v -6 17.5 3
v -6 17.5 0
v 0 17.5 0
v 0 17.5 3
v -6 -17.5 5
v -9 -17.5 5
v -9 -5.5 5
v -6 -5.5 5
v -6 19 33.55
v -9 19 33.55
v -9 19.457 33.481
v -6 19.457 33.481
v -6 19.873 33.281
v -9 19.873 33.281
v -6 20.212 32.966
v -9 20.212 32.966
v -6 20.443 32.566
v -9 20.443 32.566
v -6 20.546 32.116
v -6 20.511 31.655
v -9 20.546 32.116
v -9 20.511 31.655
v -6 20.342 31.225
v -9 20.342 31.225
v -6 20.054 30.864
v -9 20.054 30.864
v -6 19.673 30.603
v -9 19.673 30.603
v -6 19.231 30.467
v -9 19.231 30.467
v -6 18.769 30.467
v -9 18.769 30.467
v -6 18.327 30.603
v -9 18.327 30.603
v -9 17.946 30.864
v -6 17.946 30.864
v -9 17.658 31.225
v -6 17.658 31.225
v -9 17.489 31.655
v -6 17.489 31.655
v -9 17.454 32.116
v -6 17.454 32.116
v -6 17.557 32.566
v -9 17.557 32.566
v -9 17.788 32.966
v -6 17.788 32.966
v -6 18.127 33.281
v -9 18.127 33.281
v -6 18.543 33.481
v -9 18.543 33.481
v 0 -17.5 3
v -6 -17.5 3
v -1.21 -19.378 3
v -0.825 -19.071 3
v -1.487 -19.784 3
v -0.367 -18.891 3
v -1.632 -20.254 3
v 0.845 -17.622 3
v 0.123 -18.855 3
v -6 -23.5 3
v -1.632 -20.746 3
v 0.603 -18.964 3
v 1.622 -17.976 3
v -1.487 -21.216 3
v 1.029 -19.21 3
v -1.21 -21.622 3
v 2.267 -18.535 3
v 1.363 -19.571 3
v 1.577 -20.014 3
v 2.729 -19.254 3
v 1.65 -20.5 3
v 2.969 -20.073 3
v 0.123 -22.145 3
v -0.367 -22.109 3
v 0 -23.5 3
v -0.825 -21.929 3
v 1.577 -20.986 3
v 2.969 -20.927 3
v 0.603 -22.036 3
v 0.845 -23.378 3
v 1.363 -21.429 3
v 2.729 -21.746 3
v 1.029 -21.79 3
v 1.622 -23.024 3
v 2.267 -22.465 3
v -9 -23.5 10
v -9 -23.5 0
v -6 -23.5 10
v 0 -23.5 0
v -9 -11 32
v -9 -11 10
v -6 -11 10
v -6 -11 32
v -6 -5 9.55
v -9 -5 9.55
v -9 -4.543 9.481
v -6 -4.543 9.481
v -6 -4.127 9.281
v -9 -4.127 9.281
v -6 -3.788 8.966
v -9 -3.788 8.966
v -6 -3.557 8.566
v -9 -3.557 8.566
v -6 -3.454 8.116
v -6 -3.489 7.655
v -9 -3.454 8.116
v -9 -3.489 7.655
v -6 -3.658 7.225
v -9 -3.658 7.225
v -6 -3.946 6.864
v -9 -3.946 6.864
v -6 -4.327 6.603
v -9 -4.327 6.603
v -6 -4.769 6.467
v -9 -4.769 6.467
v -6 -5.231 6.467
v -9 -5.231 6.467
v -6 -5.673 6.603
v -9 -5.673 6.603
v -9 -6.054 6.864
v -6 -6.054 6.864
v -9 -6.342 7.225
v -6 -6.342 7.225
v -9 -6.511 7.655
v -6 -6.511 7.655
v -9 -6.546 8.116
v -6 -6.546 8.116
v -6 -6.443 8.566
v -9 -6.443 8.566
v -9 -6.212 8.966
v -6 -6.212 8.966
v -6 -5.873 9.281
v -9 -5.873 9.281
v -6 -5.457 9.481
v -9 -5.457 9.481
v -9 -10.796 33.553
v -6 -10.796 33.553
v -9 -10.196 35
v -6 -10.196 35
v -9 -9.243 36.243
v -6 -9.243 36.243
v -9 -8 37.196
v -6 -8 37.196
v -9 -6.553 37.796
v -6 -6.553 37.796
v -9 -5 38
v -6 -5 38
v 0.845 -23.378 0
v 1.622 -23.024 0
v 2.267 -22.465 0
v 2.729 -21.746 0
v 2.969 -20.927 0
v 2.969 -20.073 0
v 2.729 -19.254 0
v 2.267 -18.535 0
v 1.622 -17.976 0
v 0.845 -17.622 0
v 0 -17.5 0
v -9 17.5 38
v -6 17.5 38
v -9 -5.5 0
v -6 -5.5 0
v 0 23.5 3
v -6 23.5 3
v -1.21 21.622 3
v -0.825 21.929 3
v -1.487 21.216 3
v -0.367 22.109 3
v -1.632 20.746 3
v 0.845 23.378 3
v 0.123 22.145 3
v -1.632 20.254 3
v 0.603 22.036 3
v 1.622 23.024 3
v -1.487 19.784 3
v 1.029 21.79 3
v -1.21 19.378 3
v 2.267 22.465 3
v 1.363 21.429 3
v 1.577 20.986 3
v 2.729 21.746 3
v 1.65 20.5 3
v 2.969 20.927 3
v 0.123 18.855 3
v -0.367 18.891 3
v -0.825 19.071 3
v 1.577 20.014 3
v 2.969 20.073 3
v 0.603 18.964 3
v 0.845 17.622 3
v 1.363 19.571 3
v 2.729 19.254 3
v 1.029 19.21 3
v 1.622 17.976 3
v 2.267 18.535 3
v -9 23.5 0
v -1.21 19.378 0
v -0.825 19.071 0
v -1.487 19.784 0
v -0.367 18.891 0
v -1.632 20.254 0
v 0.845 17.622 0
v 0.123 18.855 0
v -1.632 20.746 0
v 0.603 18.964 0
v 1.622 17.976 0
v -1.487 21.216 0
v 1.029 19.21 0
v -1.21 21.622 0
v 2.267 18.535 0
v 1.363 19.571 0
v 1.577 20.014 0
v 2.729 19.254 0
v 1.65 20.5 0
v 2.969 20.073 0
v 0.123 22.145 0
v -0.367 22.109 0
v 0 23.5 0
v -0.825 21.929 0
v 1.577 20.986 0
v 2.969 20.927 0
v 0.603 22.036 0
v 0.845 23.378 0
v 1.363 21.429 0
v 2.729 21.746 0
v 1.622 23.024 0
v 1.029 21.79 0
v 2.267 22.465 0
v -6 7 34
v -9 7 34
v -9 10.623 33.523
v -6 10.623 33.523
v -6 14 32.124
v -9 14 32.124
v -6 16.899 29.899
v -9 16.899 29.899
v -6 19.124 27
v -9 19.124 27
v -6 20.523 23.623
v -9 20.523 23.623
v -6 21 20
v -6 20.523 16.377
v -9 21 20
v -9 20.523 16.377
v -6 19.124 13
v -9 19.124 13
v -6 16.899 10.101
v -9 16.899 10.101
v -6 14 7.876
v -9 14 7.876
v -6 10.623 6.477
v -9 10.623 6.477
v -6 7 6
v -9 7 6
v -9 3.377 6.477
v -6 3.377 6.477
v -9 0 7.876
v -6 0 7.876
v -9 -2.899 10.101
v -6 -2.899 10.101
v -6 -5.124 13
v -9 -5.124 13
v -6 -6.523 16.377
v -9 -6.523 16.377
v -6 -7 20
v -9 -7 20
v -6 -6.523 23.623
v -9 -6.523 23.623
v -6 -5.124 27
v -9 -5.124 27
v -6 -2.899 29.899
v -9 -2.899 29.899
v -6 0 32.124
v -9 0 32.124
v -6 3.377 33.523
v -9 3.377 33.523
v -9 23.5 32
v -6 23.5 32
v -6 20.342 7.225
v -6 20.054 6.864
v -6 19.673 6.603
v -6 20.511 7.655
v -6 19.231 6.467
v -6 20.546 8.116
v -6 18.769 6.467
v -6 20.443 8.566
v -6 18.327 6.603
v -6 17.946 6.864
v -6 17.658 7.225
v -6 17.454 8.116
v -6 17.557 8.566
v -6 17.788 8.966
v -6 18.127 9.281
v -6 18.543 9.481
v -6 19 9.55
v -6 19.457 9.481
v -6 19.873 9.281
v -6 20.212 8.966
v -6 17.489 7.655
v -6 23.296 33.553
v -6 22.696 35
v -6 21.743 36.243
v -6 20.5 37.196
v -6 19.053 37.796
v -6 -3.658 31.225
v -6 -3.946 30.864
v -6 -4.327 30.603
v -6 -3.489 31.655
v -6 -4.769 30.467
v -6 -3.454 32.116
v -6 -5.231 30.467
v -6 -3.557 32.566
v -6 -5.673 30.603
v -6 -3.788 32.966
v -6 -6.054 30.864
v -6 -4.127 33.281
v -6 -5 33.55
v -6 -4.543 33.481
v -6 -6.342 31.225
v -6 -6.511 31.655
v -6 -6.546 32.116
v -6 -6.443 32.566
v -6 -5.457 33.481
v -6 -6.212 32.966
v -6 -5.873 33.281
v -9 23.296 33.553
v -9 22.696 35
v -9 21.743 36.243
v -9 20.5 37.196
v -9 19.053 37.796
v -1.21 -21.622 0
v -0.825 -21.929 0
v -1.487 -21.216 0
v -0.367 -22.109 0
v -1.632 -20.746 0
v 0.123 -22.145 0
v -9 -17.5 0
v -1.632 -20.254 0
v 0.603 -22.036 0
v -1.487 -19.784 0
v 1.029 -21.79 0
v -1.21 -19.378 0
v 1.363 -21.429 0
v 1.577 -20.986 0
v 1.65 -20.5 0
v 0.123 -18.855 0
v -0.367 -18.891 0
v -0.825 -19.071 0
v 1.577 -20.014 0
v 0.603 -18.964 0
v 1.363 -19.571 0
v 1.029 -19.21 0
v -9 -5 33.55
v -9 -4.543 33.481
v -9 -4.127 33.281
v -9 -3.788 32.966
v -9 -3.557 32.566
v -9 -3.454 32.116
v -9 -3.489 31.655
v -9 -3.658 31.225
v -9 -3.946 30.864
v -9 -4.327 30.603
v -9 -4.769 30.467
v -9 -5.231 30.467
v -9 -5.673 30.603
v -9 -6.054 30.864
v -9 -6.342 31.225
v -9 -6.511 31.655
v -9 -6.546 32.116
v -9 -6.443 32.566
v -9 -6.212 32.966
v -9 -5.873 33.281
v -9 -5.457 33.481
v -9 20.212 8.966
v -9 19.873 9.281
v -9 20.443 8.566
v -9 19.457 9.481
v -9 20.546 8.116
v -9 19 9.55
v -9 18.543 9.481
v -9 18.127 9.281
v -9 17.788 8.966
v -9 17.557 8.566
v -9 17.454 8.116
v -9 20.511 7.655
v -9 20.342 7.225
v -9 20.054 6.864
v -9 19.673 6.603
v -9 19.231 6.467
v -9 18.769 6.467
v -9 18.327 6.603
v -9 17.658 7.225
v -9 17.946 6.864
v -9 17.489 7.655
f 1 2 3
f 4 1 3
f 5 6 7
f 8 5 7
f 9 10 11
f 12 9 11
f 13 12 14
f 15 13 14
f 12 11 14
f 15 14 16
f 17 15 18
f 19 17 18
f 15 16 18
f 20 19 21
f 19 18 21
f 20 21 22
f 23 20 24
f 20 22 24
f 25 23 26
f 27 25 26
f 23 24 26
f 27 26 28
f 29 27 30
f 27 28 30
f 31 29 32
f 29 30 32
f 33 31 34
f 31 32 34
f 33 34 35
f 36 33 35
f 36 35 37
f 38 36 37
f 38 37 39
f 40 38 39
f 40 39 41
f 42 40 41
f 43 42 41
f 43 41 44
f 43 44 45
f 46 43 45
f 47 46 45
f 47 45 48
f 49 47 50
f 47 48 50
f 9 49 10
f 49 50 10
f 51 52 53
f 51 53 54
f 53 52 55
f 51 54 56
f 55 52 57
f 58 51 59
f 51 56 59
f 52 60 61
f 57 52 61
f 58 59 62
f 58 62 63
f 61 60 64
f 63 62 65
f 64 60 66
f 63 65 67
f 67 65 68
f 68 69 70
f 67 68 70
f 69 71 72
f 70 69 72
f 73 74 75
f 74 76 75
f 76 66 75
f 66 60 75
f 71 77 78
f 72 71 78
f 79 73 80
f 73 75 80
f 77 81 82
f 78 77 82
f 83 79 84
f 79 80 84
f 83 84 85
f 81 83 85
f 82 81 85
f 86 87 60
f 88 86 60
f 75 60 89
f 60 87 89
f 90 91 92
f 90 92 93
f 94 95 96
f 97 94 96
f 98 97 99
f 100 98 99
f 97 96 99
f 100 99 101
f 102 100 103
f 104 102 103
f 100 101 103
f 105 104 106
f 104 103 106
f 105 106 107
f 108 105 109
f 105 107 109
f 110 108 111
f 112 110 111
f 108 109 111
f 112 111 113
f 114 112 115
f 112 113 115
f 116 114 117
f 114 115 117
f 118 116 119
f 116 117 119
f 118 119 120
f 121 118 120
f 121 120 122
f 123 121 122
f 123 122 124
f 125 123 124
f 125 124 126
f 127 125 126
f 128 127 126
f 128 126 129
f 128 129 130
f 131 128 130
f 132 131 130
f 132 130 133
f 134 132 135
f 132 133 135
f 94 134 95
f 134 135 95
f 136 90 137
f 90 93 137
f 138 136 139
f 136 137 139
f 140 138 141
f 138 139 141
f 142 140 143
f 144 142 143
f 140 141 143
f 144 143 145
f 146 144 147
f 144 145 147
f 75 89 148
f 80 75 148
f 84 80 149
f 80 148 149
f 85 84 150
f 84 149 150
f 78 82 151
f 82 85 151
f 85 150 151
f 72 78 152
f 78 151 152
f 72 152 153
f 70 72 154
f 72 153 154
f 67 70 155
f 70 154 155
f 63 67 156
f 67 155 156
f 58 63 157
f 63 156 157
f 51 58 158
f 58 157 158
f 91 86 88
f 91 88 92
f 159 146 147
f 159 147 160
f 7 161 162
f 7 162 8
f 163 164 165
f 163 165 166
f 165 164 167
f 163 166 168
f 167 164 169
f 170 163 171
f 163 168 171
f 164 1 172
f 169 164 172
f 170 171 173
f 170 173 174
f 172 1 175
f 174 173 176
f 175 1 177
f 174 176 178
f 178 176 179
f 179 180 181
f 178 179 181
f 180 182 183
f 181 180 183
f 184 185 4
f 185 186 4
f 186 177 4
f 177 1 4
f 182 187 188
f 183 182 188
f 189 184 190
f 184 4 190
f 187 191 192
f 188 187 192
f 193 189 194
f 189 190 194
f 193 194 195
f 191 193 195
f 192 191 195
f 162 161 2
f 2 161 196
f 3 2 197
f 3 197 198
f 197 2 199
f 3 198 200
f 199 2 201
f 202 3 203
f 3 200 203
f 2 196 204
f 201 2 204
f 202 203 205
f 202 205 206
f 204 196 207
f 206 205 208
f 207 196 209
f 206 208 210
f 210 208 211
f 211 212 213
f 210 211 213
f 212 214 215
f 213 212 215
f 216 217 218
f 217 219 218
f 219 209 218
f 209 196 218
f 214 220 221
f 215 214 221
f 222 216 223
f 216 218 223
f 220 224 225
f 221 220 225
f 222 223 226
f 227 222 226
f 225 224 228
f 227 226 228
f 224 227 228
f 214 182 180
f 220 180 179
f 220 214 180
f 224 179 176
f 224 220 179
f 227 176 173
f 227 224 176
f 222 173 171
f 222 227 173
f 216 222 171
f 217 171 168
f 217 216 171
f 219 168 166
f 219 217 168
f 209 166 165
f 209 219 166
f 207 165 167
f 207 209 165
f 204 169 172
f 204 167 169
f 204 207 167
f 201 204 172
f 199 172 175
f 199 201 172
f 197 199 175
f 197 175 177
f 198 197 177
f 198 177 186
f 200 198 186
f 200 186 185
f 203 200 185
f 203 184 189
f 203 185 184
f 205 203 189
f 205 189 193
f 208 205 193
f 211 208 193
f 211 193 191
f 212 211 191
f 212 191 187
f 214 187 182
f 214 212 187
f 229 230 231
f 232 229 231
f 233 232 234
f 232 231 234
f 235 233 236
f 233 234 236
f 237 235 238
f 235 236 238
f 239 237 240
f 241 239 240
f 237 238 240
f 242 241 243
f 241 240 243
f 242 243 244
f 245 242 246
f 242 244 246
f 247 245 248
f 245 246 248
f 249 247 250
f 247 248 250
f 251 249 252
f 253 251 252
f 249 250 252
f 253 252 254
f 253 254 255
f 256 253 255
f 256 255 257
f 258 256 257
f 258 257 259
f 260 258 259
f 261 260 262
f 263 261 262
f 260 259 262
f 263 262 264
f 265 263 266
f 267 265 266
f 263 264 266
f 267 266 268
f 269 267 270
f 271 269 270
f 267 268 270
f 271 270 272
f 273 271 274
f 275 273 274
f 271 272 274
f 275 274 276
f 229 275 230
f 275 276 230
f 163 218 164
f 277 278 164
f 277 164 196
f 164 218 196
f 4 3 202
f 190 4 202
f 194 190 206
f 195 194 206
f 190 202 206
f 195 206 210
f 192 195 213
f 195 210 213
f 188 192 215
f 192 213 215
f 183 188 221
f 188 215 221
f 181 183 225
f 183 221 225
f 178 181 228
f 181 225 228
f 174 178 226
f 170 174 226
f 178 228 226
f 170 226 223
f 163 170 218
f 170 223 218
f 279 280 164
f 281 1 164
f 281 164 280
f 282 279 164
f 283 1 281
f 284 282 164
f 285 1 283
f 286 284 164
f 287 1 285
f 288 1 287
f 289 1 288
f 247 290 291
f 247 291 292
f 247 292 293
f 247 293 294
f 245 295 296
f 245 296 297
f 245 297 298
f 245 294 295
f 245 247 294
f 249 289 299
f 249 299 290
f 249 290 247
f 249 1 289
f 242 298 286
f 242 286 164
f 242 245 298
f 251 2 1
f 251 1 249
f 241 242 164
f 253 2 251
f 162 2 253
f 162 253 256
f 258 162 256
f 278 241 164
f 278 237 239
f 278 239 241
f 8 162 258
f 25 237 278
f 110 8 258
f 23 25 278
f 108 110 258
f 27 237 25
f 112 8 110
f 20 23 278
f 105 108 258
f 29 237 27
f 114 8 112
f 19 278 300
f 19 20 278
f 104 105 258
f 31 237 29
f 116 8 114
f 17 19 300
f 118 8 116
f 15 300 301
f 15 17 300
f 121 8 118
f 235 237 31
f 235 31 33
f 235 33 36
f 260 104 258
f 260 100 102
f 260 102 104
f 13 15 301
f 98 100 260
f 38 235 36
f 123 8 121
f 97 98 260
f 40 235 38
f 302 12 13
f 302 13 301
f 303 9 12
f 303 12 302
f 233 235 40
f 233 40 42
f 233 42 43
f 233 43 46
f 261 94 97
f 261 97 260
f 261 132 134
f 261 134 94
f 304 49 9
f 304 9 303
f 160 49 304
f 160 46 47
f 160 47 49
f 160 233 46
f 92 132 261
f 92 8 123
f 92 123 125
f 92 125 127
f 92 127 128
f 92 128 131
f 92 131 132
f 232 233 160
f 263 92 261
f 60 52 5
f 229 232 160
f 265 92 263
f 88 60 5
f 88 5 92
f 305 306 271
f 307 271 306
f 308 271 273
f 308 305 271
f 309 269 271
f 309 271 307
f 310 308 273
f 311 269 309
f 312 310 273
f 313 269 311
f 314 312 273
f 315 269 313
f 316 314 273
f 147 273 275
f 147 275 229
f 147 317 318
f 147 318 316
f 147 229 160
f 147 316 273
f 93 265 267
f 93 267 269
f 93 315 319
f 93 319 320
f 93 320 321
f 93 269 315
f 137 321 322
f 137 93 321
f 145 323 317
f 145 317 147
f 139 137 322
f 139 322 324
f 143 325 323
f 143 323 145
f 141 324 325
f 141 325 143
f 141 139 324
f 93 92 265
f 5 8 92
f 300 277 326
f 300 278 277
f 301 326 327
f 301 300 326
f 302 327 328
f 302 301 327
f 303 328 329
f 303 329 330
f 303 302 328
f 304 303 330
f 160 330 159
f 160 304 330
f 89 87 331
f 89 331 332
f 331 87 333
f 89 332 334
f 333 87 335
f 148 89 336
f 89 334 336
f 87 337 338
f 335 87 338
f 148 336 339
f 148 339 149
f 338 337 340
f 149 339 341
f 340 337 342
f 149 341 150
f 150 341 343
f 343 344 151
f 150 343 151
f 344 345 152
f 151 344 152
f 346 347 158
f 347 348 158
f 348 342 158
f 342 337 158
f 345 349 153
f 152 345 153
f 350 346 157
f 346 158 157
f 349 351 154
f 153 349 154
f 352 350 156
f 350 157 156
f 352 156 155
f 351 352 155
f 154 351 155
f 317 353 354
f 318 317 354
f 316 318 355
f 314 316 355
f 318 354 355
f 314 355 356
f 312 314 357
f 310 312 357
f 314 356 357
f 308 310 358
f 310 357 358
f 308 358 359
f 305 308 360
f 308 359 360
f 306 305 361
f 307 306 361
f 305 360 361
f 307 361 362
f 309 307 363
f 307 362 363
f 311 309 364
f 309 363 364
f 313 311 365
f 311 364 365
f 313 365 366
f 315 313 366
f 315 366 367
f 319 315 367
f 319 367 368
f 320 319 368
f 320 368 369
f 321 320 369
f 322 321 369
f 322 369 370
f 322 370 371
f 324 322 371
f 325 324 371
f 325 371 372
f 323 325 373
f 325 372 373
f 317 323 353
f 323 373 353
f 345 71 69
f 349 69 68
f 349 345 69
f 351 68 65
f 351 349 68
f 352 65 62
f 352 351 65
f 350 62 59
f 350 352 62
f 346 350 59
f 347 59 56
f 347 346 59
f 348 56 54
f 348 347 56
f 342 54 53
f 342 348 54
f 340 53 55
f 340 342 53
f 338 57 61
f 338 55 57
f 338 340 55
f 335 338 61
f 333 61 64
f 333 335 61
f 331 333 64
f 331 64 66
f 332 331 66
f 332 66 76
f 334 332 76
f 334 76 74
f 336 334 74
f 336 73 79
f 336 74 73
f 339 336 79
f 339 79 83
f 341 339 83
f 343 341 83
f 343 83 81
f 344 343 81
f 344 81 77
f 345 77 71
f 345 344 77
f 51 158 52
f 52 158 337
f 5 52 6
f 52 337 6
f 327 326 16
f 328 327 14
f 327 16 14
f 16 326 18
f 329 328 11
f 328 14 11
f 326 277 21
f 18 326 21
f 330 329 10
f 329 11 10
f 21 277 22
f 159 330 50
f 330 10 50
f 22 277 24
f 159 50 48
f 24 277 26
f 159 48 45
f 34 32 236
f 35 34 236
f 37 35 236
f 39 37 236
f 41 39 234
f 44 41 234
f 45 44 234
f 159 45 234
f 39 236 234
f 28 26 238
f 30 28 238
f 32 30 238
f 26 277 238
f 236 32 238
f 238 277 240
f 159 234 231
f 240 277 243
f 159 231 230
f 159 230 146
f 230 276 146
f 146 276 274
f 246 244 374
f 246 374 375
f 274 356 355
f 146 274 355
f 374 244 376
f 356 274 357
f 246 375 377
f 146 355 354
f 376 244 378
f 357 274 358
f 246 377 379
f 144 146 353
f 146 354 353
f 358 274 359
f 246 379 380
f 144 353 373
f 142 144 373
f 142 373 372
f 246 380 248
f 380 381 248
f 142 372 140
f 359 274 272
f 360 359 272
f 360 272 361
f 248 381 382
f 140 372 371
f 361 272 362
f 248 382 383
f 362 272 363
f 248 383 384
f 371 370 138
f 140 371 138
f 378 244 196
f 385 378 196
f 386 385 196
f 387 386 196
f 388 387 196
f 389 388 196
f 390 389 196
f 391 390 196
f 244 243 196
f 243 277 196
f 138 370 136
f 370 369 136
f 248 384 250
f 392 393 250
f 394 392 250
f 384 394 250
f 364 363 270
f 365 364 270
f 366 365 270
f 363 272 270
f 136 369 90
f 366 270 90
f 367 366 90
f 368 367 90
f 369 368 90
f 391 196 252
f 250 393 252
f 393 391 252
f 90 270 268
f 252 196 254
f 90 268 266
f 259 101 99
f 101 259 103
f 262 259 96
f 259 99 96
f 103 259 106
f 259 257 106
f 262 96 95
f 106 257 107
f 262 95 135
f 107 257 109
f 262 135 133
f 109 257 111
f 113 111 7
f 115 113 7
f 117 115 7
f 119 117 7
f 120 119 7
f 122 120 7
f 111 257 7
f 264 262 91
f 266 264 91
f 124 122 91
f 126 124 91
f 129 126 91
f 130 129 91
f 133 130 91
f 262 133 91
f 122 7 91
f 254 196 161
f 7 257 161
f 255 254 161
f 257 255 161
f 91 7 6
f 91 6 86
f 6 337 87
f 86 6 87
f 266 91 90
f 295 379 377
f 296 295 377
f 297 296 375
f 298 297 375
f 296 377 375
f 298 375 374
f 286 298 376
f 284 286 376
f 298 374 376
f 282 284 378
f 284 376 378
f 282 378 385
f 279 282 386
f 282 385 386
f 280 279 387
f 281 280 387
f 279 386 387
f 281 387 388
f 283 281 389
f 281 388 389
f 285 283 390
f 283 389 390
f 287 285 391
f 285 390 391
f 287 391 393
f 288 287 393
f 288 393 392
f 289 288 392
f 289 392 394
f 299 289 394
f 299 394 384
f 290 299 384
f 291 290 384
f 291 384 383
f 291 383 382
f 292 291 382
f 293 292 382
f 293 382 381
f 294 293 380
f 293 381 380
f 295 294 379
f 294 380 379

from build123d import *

# Parameters (mm, degrees)
ESBO_O1_R                  = 1.65
RESSALTO_EXTRUS_O1_DEPTH   = 40
ESBO_O2_W                  = 9
ESBO_O2_H                  = 37
CORTE_EXTRUS_O1_DEPTH      = 48
ESBO_O3_R                  = 14
ESBO_O3_R_2                = 1.55
ESBO_O3_W                  = 5
ESBO_O3_H                  = 12
CORTE_EXTRUS_O2_DEPTH      = 1
CORTE_EXTRUS_O2_DEPTH_BACK = 3
FILETE1_R                  = 6


with BuildPart() as part:
    # Esboço1 → Ressalto-extrusão1 (new body)
    with BuildSketch(Plane.XY):
        with BuildLine():
            Line((0, 23.5), (-9, 23.5))
            Line((-9, 23.5), (-9, -23.5))
            Line((-9, -23.5), (0, -23.5))
            ThreePointArc((0, -23.5), (3, -20.5), (0, -17.5))
            Line((0, -17.5), (-6, -17.5))
            Line((-6, -17.5), (-6, 17.5))
            Line((-6, 17.5), (0, 17.5))
            ThreePointArc((0, 17.5), (3, 20.5), (0, 23.5))
        make_face()
        with Locations((0, 20.5)):
            Circle(ESBO_O1_R, mode=Mode.SUBTRACT)
        with Locations((0, -20.5)):
            Circle(ESBO_O1_R, mode=Mode.SUBTRACT)
    extrude(amount=RESSALTO_EXTRUS_O1_DEPTH)

    # Esboço2 → Corte-extrusão1 (cut, through all)
    with BuildSketch(Plane.XZ.offset(23.5)):
        with Locations((-1.5, 21.5)):
            Rectangle(ESBO_O2_W, ESBO_O2_H)
    extrude(amount=-CORTE_EXTRUS_O1_DEPTH, mode=Mode.SUBTRACT)

    # Esboço3 → Corte-extrusão2 (cut, two sides)
    with BuildSketch(Plane.ZY.offset(9)) as corte_extrus_o2_sk:
        with Locations((20, 7)):
            Circle(ESBO_O3_R)
        with Locations((32, 19)):
            Circle(ESBO_O3_R_2)
        with Locations((32, -5)):
            Circle(ESBO_O3_R_2)
        with Locations((8, -5)):
            Circle(ESBO_O3_R_2)
        with Locations((8, 19)):
            Circle(ESBO_O3_R_2)
        with Locations((2.5, -11.5)):
            Rectangle(ESBO_O3_W, ESBO_O3_H)
        Polygon((10, -23.5), (10, -11), (38, -11), (38, 23.5), (40, 23.5), (40, -8), (40, -23.5), align=None)
    extrude(amount=CORTE_EXTRUS_O2_DEPTH, mode=Mode.SUBTRACT)
    extrude(corte_extrus_o2_sk.sketch, amount=-CORTE_EXTRUS_O2_DEPTH_BACK, mode=Mode.SUBTRACT)

    # Filete1
    filete1_edges = [part.edges().sort_by_distance(p)[0] for p in [
        (-7.5, -11, 38),
        (-7.5, 23.5, 38),
    ]]
    fillet(filete1_edges, radius=FILETE1_R)


solid = part.part
